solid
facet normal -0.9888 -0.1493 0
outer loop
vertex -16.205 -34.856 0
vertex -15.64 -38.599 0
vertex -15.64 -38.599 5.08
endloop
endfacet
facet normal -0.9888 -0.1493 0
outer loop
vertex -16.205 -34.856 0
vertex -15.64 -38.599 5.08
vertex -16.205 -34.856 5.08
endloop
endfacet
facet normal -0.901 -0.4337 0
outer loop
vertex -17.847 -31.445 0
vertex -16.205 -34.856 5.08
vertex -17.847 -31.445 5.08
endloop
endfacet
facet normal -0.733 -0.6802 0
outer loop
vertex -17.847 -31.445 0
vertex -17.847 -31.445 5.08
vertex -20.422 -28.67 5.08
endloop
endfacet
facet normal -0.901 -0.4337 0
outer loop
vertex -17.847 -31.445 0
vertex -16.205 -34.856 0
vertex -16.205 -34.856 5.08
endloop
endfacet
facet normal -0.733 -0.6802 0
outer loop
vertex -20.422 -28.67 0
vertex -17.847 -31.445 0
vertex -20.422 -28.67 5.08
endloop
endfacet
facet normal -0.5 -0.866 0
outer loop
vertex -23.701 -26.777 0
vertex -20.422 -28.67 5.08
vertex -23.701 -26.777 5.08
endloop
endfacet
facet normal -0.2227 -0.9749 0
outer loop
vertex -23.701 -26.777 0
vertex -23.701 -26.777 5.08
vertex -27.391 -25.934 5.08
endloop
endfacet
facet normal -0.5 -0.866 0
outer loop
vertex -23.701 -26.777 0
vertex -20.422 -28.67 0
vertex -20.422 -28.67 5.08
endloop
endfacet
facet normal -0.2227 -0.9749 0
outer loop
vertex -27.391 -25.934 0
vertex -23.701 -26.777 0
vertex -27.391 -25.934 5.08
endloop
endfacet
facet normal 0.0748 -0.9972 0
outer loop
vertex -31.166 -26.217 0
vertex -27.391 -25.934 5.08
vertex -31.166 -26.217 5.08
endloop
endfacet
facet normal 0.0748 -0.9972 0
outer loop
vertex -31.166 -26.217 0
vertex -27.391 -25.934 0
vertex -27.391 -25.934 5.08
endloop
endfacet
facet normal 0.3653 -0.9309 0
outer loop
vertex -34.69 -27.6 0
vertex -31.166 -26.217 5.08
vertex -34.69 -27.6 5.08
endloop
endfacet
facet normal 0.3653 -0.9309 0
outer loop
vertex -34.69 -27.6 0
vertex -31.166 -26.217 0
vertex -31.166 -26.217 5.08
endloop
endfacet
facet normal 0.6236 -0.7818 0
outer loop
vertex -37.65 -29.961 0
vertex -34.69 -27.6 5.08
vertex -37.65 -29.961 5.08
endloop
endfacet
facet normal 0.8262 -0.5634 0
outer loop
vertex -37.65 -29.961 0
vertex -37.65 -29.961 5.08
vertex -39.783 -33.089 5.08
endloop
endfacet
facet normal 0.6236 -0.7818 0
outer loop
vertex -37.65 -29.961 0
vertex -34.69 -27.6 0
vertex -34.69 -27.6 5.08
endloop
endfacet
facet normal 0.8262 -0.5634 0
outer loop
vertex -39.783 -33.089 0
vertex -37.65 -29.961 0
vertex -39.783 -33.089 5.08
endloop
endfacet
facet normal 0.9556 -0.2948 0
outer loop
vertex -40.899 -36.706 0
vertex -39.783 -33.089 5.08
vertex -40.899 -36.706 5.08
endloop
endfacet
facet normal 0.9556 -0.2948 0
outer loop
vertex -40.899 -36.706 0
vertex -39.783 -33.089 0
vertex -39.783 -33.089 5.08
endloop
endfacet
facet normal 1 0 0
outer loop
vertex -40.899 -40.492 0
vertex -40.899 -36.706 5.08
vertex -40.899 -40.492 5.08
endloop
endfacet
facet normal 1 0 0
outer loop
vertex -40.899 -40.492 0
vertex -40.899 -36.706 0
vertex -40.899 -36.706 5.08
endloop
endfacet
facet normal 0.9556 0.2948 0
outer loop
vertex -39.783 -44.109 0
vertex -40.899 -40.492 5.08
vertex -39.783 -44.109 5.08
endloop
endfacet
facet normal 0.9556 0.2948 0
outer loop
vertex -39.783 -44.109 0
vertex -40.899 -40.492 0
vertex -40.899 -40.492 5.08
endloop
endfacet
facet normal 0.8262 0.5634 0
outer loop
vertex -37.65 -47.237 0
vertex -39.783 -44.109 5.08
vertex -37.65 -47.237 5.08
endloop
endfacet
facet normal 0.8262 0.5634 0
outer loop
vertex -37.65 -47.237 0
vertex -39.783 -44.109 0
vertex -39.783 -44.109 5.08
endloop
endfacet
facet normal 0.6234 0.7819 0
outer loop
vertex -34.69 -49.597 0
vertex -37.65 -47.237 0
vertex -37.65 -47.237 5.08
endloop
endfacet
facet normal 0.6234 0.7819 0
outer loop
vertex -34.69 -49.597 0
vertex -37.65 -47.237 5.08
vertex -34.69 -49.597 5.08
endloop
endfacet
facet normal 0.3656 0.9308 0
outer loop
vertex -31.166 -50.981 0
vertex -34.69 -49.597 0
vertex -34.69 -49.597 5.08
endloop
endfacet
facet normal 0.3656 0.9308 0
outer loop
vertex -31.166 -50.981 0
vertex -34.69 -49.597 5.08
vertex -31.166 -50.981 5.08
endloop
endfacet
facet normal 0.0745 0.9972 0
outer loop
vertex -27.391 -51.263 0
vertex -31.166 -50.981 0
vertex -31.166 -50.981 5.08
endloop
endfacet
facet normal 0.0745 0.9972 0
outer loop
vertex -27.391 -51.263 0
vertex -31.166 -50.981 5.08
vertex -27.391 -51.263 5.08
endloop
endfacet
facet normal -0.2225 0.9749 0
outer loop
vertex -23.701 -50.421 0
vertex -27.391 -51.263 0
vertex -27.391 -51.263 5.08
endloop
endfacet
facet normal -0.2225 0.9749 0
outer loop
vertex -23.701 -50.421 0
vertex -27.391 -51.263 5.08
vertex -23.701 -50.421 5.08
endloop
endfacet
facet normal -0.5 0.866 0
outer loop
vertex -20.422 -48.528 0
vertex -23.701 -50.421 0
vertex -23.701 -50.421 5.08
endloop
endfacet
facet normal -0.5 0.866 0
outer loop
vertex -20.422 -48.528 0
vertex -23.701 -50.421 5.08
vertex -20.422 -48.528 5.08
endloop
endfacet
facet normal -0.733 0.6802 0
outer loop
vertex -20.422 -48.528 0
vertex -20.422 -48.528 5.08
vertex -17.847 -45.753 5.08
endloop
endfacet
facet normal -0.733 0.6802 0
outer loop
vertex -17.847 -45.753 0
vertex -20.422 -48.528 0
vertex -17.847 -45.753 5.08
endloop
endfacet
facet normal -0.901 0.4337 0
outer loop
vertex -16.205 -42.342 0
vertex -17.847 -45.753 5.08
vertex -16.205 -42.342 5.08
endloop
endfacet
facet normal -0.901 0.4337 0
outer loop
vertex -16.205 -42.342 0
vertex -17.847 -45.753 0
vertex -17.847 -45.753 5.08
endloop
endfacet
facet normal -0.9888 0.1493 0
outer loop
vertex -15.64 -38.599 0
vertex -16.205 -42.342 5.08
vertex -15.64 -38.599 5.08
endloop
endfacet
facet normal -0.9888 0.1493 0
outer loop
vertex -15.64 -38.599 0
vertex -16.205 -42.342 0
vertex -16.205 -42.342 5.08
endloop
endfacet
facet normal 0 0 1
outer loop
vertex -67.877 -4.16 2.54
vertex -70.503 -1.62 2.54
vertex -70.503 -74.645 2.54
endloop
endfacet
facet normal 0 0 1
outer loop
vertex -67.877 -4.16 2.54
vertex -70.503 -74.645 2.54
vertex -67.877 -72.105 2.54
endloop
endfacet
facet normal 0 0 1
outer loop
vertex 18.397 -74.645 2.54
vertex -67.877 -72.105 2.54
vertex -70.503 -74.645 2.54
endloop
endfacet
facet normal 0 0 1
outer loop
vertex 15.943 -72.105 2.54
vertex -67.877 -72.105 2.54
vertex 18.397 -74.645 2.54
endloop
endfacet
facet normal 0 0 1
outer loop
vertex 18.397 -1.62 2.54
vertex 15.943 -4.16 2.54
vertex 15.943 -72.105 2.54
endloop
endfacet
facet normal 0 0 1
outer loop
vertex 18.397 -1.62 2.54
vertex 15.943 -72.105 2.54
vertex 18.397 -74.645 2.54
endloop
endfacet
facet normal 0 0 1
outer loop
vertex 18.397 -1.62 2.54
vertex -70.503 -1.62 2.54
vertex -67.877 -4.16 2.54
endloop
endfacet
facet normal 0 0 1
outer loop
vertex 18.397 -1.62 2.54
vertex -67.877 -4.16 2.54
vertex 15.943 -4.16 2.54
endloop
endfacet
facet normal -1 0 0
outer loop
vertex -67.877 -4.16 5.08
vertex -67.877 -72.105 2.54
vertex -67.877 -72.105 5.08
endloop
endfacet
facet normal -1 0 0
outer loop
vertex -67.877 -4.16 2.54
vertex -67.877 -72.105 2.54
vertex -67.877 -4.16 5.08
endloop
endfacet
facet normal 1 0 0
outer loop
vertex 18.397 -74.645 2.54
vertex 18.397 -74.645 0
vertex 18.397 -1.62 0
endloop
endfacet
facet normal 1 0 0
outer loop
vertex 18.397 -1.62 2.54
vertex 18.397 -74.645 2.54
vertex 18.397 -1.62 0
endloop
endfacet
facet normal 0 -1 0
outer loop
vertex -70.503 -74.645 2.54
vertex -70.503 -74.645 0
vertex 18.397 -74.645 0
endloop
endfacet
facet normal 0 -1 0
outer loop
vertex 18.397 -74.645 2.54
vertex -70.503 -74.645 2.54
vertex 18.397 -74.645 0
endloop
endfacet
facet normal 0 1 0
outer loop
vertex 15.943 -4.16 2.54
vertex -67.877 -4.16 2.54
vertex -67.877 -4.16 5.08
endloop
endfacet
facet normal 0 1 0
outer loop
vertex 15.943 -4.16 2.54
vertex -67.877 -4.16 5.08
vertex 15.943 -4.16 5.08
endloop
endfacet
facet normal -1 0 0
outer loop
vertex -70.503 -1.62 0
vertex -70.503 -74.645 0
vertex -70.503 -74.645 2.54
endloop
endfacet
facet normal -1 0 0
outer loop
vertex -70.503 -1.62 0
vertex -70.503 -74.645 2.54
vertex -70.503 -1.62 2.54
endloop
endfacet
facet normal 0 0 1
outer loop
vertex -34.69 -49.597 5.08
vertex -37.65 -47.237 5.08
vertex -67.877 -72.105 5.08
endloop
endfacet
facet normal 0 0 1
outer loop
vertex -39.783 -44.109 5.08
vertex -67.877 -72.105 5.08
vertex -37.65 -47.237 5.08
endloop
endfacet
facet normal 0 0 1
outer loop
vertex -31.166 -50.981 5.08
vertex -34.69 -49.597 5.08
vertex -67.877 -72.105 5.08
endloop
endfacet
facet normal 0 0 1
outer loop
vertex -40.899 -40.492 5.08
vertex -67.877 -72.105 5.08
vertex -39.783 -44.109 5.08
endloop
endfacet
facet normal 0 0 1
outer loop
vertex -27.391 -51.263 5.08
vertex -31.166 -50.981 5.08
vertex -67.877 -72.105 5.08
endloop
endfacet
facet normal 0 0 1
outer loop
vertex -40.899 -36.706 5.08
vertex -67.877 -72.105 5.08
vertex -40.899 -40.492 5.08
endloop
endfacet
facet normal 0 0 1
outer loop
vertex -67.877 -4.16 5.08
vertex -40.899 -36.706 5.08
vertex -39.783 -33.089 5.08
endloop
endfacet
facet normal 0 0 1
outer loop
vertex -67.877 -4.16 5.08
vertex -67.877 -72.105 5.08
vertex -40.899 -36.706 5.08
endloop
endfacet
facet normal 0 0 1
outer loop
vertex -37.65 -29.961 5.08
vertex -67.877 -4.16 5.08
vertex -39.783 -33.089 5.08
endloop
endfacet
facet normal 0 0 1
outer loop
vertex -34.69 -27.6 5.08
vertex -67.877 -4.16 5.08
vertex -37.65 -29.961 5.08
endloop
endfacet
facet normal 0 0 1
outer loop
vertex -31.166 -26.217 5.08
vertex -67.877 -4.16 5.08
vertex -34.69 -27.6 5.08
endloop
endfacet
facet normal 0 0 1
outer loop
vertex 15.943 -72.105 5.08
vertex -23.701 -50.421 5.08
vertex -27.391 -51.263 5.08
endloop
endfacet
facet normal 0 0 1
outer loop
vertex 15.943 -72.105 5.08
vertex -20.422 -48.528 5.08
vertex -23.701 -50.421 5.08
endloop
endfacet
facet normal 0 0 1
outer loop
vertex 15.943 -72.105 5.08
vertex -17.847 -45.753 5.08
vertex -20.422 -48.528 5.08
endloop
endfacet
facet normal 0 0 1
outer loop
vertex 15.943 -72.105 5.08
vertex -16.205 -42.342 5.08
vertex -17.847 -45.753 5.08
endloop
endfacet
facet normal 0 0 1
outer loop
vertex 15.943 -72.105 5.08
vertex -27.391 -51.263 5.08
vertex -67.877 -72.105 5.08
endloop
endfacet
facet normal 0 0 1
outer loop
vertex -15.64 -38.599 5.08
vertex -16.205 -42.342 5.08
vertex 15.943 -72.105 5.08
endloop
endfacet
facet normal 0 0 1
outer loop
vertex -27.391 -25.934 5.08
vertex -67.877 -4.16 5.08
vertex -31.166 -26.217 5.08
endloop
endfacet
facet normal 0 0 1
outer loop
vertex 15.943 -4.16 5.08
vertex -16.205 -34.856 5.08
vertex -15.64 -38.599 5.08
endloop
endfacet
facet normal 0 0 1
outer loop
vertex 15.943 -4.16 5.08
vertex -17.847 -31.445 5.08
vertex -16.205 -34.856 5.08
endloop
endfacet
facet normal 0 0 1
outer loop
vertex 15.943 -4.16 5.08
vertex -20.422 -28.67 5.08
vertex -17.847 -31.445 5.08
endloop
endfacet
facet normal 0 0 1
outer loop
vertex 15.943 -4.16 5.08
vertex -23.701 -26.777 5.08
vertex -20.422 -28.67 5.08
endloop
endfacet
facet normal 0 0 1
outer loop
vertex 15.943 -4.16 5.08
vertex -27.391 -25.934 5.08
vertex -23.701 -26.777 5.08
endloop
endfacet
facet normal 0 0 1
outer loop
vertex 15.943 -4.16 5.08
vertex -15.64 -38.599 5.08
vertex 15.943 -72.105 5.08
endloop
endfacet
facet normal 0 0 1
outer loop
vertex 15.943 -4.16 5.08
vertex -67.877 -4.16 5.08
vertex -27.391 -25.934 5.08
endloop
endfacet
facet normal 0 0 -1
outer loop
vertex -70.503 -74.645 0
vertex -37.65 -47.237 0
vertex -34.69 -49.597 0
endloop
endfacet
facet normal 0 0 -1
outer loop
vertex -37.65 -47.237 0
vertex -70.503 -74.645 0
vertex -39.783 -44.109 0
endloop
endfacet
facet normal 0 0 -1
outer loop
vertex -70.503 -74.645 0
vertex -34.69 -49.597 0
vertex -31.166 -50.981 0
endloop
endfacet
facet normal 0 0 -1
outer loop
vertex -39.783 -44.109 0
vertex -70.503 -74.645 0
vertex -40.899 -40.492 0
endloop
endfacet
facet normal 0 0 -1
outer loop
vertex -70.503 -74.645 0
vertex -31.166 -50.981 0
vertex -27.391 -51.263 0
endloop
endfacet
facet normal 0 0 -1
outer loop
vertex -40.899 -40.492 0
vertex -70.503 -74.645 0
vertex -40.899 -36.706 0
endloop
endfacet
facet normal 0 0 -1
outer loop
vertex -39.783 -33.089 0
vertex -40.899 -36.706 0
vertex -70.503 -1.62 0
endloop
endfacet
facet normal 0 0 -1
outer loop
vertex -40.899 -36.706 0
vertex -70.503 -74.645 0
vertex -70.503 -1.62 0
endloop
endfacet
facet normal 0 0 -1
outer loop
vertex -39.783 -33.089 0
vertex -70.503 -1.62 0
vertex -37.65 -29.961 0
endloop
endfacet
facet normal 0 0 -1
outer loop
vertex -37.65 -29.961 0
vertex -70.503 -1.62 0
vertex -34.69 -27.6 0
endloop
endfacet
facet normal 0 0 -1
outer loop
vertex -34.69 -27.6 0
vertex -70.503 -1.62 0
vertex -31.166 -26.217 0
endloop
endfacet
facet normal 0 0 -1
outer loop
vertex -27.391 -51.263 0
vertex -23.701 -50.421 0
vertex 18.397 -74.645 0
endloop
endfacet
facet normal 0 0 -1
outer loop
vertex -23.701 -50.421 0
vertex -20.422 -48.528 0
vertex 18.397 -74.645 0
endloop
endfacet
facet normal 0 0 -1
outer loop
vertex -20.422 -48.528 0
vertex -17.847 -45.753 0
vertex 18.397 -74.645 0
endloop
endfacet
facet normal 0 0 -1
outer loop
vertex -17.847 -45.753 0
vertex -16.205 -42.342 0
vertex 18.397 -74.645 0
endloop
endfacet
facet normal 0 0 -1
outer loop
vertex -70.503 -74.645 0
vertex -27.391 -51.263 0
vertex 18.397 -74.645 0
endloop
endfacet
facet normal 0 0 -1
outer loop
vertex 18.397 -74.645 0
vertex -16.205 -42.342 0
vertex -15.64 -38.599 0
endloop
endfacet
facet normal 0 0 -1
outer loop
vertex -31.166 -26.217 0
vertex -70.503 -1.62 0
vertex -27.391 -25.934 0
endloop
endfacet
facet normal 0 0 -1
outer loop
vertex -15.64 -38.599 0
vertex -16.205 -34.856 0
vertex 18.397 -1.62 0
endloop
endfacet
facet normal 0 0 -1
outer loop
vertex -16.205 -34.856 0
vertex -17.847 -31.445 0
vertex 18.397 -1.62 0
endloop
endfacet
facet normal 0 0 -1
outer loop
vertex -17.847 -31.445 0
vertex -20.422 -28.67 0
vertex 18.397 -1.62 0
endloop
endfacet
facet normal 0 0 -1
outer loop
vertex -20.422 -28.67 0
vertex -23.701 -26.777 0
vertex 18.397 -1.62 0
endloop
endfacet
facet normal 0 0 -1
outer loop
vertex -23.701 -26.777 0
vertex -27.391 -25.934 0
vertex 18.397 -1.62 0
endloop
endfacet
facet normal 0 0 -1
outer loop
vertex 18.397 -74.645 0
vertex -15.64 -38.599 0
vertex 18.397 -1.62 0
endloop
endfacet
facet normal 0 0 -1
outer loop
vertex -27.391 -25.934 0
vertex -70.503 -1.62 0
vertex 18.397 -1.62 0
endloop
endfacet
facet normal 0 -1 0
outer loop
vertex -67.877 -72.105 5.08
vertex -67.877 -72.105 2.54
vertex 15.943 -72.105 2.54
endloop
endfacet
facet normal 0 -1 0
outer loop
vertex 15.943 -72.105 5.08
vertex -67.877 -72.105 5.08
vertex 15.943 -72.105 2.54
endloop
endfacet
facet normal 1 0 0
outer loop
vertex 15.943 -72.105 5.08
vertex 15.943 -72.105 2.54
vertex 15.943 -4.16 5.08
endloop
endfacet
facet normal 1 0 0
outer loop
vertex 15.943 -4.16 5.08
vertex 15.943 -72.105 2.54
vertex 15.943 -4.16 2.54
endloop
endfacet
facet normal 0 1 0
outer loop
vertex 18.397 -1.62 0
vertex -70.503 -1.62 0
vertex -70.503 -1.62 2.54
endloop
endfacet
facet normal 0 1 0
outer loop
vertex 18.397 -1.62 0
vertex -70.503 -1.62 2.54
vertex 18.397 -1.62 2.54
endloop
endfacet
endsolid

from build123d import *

# Parameters (mm, degrees)
F0_W     = 88.9
F0_H     = 73.025
F0_W_2   = 83.82
F0_H_2   = 67.945
F1_DEPTH = 2.54
F0_R     = 12.7
F2_DEPTH = 5.08


with BuildPart() as f1:
    # F0 (on Top) → F1 (new body)
    with BuildSketch(Plane.XY):
        with Locations((-26.052929, -38.132125)):
            Rectangle(F0_W, F0_H)
        with Locations((-25.966533, -38.132125)):
            Rectangle(F0_W_2, F0_H_2, mode=Mode.SUBTRACT)
    extrude(amount=F1_DEPTH)

    # F0 (on Top) → F2 (join)
    with BuildSketch(Plane.XY):
        with Locations((-25.966533, -38.132125)):
            Rectangle(F0_W_2, F0_H_2)
        with Locations((-28.340409, -38.598955)):
            Circle(F0_R, mode=Mode.SUBTRACT)
    extrude(amount=F2_DEPTH)


solid = f1.part
